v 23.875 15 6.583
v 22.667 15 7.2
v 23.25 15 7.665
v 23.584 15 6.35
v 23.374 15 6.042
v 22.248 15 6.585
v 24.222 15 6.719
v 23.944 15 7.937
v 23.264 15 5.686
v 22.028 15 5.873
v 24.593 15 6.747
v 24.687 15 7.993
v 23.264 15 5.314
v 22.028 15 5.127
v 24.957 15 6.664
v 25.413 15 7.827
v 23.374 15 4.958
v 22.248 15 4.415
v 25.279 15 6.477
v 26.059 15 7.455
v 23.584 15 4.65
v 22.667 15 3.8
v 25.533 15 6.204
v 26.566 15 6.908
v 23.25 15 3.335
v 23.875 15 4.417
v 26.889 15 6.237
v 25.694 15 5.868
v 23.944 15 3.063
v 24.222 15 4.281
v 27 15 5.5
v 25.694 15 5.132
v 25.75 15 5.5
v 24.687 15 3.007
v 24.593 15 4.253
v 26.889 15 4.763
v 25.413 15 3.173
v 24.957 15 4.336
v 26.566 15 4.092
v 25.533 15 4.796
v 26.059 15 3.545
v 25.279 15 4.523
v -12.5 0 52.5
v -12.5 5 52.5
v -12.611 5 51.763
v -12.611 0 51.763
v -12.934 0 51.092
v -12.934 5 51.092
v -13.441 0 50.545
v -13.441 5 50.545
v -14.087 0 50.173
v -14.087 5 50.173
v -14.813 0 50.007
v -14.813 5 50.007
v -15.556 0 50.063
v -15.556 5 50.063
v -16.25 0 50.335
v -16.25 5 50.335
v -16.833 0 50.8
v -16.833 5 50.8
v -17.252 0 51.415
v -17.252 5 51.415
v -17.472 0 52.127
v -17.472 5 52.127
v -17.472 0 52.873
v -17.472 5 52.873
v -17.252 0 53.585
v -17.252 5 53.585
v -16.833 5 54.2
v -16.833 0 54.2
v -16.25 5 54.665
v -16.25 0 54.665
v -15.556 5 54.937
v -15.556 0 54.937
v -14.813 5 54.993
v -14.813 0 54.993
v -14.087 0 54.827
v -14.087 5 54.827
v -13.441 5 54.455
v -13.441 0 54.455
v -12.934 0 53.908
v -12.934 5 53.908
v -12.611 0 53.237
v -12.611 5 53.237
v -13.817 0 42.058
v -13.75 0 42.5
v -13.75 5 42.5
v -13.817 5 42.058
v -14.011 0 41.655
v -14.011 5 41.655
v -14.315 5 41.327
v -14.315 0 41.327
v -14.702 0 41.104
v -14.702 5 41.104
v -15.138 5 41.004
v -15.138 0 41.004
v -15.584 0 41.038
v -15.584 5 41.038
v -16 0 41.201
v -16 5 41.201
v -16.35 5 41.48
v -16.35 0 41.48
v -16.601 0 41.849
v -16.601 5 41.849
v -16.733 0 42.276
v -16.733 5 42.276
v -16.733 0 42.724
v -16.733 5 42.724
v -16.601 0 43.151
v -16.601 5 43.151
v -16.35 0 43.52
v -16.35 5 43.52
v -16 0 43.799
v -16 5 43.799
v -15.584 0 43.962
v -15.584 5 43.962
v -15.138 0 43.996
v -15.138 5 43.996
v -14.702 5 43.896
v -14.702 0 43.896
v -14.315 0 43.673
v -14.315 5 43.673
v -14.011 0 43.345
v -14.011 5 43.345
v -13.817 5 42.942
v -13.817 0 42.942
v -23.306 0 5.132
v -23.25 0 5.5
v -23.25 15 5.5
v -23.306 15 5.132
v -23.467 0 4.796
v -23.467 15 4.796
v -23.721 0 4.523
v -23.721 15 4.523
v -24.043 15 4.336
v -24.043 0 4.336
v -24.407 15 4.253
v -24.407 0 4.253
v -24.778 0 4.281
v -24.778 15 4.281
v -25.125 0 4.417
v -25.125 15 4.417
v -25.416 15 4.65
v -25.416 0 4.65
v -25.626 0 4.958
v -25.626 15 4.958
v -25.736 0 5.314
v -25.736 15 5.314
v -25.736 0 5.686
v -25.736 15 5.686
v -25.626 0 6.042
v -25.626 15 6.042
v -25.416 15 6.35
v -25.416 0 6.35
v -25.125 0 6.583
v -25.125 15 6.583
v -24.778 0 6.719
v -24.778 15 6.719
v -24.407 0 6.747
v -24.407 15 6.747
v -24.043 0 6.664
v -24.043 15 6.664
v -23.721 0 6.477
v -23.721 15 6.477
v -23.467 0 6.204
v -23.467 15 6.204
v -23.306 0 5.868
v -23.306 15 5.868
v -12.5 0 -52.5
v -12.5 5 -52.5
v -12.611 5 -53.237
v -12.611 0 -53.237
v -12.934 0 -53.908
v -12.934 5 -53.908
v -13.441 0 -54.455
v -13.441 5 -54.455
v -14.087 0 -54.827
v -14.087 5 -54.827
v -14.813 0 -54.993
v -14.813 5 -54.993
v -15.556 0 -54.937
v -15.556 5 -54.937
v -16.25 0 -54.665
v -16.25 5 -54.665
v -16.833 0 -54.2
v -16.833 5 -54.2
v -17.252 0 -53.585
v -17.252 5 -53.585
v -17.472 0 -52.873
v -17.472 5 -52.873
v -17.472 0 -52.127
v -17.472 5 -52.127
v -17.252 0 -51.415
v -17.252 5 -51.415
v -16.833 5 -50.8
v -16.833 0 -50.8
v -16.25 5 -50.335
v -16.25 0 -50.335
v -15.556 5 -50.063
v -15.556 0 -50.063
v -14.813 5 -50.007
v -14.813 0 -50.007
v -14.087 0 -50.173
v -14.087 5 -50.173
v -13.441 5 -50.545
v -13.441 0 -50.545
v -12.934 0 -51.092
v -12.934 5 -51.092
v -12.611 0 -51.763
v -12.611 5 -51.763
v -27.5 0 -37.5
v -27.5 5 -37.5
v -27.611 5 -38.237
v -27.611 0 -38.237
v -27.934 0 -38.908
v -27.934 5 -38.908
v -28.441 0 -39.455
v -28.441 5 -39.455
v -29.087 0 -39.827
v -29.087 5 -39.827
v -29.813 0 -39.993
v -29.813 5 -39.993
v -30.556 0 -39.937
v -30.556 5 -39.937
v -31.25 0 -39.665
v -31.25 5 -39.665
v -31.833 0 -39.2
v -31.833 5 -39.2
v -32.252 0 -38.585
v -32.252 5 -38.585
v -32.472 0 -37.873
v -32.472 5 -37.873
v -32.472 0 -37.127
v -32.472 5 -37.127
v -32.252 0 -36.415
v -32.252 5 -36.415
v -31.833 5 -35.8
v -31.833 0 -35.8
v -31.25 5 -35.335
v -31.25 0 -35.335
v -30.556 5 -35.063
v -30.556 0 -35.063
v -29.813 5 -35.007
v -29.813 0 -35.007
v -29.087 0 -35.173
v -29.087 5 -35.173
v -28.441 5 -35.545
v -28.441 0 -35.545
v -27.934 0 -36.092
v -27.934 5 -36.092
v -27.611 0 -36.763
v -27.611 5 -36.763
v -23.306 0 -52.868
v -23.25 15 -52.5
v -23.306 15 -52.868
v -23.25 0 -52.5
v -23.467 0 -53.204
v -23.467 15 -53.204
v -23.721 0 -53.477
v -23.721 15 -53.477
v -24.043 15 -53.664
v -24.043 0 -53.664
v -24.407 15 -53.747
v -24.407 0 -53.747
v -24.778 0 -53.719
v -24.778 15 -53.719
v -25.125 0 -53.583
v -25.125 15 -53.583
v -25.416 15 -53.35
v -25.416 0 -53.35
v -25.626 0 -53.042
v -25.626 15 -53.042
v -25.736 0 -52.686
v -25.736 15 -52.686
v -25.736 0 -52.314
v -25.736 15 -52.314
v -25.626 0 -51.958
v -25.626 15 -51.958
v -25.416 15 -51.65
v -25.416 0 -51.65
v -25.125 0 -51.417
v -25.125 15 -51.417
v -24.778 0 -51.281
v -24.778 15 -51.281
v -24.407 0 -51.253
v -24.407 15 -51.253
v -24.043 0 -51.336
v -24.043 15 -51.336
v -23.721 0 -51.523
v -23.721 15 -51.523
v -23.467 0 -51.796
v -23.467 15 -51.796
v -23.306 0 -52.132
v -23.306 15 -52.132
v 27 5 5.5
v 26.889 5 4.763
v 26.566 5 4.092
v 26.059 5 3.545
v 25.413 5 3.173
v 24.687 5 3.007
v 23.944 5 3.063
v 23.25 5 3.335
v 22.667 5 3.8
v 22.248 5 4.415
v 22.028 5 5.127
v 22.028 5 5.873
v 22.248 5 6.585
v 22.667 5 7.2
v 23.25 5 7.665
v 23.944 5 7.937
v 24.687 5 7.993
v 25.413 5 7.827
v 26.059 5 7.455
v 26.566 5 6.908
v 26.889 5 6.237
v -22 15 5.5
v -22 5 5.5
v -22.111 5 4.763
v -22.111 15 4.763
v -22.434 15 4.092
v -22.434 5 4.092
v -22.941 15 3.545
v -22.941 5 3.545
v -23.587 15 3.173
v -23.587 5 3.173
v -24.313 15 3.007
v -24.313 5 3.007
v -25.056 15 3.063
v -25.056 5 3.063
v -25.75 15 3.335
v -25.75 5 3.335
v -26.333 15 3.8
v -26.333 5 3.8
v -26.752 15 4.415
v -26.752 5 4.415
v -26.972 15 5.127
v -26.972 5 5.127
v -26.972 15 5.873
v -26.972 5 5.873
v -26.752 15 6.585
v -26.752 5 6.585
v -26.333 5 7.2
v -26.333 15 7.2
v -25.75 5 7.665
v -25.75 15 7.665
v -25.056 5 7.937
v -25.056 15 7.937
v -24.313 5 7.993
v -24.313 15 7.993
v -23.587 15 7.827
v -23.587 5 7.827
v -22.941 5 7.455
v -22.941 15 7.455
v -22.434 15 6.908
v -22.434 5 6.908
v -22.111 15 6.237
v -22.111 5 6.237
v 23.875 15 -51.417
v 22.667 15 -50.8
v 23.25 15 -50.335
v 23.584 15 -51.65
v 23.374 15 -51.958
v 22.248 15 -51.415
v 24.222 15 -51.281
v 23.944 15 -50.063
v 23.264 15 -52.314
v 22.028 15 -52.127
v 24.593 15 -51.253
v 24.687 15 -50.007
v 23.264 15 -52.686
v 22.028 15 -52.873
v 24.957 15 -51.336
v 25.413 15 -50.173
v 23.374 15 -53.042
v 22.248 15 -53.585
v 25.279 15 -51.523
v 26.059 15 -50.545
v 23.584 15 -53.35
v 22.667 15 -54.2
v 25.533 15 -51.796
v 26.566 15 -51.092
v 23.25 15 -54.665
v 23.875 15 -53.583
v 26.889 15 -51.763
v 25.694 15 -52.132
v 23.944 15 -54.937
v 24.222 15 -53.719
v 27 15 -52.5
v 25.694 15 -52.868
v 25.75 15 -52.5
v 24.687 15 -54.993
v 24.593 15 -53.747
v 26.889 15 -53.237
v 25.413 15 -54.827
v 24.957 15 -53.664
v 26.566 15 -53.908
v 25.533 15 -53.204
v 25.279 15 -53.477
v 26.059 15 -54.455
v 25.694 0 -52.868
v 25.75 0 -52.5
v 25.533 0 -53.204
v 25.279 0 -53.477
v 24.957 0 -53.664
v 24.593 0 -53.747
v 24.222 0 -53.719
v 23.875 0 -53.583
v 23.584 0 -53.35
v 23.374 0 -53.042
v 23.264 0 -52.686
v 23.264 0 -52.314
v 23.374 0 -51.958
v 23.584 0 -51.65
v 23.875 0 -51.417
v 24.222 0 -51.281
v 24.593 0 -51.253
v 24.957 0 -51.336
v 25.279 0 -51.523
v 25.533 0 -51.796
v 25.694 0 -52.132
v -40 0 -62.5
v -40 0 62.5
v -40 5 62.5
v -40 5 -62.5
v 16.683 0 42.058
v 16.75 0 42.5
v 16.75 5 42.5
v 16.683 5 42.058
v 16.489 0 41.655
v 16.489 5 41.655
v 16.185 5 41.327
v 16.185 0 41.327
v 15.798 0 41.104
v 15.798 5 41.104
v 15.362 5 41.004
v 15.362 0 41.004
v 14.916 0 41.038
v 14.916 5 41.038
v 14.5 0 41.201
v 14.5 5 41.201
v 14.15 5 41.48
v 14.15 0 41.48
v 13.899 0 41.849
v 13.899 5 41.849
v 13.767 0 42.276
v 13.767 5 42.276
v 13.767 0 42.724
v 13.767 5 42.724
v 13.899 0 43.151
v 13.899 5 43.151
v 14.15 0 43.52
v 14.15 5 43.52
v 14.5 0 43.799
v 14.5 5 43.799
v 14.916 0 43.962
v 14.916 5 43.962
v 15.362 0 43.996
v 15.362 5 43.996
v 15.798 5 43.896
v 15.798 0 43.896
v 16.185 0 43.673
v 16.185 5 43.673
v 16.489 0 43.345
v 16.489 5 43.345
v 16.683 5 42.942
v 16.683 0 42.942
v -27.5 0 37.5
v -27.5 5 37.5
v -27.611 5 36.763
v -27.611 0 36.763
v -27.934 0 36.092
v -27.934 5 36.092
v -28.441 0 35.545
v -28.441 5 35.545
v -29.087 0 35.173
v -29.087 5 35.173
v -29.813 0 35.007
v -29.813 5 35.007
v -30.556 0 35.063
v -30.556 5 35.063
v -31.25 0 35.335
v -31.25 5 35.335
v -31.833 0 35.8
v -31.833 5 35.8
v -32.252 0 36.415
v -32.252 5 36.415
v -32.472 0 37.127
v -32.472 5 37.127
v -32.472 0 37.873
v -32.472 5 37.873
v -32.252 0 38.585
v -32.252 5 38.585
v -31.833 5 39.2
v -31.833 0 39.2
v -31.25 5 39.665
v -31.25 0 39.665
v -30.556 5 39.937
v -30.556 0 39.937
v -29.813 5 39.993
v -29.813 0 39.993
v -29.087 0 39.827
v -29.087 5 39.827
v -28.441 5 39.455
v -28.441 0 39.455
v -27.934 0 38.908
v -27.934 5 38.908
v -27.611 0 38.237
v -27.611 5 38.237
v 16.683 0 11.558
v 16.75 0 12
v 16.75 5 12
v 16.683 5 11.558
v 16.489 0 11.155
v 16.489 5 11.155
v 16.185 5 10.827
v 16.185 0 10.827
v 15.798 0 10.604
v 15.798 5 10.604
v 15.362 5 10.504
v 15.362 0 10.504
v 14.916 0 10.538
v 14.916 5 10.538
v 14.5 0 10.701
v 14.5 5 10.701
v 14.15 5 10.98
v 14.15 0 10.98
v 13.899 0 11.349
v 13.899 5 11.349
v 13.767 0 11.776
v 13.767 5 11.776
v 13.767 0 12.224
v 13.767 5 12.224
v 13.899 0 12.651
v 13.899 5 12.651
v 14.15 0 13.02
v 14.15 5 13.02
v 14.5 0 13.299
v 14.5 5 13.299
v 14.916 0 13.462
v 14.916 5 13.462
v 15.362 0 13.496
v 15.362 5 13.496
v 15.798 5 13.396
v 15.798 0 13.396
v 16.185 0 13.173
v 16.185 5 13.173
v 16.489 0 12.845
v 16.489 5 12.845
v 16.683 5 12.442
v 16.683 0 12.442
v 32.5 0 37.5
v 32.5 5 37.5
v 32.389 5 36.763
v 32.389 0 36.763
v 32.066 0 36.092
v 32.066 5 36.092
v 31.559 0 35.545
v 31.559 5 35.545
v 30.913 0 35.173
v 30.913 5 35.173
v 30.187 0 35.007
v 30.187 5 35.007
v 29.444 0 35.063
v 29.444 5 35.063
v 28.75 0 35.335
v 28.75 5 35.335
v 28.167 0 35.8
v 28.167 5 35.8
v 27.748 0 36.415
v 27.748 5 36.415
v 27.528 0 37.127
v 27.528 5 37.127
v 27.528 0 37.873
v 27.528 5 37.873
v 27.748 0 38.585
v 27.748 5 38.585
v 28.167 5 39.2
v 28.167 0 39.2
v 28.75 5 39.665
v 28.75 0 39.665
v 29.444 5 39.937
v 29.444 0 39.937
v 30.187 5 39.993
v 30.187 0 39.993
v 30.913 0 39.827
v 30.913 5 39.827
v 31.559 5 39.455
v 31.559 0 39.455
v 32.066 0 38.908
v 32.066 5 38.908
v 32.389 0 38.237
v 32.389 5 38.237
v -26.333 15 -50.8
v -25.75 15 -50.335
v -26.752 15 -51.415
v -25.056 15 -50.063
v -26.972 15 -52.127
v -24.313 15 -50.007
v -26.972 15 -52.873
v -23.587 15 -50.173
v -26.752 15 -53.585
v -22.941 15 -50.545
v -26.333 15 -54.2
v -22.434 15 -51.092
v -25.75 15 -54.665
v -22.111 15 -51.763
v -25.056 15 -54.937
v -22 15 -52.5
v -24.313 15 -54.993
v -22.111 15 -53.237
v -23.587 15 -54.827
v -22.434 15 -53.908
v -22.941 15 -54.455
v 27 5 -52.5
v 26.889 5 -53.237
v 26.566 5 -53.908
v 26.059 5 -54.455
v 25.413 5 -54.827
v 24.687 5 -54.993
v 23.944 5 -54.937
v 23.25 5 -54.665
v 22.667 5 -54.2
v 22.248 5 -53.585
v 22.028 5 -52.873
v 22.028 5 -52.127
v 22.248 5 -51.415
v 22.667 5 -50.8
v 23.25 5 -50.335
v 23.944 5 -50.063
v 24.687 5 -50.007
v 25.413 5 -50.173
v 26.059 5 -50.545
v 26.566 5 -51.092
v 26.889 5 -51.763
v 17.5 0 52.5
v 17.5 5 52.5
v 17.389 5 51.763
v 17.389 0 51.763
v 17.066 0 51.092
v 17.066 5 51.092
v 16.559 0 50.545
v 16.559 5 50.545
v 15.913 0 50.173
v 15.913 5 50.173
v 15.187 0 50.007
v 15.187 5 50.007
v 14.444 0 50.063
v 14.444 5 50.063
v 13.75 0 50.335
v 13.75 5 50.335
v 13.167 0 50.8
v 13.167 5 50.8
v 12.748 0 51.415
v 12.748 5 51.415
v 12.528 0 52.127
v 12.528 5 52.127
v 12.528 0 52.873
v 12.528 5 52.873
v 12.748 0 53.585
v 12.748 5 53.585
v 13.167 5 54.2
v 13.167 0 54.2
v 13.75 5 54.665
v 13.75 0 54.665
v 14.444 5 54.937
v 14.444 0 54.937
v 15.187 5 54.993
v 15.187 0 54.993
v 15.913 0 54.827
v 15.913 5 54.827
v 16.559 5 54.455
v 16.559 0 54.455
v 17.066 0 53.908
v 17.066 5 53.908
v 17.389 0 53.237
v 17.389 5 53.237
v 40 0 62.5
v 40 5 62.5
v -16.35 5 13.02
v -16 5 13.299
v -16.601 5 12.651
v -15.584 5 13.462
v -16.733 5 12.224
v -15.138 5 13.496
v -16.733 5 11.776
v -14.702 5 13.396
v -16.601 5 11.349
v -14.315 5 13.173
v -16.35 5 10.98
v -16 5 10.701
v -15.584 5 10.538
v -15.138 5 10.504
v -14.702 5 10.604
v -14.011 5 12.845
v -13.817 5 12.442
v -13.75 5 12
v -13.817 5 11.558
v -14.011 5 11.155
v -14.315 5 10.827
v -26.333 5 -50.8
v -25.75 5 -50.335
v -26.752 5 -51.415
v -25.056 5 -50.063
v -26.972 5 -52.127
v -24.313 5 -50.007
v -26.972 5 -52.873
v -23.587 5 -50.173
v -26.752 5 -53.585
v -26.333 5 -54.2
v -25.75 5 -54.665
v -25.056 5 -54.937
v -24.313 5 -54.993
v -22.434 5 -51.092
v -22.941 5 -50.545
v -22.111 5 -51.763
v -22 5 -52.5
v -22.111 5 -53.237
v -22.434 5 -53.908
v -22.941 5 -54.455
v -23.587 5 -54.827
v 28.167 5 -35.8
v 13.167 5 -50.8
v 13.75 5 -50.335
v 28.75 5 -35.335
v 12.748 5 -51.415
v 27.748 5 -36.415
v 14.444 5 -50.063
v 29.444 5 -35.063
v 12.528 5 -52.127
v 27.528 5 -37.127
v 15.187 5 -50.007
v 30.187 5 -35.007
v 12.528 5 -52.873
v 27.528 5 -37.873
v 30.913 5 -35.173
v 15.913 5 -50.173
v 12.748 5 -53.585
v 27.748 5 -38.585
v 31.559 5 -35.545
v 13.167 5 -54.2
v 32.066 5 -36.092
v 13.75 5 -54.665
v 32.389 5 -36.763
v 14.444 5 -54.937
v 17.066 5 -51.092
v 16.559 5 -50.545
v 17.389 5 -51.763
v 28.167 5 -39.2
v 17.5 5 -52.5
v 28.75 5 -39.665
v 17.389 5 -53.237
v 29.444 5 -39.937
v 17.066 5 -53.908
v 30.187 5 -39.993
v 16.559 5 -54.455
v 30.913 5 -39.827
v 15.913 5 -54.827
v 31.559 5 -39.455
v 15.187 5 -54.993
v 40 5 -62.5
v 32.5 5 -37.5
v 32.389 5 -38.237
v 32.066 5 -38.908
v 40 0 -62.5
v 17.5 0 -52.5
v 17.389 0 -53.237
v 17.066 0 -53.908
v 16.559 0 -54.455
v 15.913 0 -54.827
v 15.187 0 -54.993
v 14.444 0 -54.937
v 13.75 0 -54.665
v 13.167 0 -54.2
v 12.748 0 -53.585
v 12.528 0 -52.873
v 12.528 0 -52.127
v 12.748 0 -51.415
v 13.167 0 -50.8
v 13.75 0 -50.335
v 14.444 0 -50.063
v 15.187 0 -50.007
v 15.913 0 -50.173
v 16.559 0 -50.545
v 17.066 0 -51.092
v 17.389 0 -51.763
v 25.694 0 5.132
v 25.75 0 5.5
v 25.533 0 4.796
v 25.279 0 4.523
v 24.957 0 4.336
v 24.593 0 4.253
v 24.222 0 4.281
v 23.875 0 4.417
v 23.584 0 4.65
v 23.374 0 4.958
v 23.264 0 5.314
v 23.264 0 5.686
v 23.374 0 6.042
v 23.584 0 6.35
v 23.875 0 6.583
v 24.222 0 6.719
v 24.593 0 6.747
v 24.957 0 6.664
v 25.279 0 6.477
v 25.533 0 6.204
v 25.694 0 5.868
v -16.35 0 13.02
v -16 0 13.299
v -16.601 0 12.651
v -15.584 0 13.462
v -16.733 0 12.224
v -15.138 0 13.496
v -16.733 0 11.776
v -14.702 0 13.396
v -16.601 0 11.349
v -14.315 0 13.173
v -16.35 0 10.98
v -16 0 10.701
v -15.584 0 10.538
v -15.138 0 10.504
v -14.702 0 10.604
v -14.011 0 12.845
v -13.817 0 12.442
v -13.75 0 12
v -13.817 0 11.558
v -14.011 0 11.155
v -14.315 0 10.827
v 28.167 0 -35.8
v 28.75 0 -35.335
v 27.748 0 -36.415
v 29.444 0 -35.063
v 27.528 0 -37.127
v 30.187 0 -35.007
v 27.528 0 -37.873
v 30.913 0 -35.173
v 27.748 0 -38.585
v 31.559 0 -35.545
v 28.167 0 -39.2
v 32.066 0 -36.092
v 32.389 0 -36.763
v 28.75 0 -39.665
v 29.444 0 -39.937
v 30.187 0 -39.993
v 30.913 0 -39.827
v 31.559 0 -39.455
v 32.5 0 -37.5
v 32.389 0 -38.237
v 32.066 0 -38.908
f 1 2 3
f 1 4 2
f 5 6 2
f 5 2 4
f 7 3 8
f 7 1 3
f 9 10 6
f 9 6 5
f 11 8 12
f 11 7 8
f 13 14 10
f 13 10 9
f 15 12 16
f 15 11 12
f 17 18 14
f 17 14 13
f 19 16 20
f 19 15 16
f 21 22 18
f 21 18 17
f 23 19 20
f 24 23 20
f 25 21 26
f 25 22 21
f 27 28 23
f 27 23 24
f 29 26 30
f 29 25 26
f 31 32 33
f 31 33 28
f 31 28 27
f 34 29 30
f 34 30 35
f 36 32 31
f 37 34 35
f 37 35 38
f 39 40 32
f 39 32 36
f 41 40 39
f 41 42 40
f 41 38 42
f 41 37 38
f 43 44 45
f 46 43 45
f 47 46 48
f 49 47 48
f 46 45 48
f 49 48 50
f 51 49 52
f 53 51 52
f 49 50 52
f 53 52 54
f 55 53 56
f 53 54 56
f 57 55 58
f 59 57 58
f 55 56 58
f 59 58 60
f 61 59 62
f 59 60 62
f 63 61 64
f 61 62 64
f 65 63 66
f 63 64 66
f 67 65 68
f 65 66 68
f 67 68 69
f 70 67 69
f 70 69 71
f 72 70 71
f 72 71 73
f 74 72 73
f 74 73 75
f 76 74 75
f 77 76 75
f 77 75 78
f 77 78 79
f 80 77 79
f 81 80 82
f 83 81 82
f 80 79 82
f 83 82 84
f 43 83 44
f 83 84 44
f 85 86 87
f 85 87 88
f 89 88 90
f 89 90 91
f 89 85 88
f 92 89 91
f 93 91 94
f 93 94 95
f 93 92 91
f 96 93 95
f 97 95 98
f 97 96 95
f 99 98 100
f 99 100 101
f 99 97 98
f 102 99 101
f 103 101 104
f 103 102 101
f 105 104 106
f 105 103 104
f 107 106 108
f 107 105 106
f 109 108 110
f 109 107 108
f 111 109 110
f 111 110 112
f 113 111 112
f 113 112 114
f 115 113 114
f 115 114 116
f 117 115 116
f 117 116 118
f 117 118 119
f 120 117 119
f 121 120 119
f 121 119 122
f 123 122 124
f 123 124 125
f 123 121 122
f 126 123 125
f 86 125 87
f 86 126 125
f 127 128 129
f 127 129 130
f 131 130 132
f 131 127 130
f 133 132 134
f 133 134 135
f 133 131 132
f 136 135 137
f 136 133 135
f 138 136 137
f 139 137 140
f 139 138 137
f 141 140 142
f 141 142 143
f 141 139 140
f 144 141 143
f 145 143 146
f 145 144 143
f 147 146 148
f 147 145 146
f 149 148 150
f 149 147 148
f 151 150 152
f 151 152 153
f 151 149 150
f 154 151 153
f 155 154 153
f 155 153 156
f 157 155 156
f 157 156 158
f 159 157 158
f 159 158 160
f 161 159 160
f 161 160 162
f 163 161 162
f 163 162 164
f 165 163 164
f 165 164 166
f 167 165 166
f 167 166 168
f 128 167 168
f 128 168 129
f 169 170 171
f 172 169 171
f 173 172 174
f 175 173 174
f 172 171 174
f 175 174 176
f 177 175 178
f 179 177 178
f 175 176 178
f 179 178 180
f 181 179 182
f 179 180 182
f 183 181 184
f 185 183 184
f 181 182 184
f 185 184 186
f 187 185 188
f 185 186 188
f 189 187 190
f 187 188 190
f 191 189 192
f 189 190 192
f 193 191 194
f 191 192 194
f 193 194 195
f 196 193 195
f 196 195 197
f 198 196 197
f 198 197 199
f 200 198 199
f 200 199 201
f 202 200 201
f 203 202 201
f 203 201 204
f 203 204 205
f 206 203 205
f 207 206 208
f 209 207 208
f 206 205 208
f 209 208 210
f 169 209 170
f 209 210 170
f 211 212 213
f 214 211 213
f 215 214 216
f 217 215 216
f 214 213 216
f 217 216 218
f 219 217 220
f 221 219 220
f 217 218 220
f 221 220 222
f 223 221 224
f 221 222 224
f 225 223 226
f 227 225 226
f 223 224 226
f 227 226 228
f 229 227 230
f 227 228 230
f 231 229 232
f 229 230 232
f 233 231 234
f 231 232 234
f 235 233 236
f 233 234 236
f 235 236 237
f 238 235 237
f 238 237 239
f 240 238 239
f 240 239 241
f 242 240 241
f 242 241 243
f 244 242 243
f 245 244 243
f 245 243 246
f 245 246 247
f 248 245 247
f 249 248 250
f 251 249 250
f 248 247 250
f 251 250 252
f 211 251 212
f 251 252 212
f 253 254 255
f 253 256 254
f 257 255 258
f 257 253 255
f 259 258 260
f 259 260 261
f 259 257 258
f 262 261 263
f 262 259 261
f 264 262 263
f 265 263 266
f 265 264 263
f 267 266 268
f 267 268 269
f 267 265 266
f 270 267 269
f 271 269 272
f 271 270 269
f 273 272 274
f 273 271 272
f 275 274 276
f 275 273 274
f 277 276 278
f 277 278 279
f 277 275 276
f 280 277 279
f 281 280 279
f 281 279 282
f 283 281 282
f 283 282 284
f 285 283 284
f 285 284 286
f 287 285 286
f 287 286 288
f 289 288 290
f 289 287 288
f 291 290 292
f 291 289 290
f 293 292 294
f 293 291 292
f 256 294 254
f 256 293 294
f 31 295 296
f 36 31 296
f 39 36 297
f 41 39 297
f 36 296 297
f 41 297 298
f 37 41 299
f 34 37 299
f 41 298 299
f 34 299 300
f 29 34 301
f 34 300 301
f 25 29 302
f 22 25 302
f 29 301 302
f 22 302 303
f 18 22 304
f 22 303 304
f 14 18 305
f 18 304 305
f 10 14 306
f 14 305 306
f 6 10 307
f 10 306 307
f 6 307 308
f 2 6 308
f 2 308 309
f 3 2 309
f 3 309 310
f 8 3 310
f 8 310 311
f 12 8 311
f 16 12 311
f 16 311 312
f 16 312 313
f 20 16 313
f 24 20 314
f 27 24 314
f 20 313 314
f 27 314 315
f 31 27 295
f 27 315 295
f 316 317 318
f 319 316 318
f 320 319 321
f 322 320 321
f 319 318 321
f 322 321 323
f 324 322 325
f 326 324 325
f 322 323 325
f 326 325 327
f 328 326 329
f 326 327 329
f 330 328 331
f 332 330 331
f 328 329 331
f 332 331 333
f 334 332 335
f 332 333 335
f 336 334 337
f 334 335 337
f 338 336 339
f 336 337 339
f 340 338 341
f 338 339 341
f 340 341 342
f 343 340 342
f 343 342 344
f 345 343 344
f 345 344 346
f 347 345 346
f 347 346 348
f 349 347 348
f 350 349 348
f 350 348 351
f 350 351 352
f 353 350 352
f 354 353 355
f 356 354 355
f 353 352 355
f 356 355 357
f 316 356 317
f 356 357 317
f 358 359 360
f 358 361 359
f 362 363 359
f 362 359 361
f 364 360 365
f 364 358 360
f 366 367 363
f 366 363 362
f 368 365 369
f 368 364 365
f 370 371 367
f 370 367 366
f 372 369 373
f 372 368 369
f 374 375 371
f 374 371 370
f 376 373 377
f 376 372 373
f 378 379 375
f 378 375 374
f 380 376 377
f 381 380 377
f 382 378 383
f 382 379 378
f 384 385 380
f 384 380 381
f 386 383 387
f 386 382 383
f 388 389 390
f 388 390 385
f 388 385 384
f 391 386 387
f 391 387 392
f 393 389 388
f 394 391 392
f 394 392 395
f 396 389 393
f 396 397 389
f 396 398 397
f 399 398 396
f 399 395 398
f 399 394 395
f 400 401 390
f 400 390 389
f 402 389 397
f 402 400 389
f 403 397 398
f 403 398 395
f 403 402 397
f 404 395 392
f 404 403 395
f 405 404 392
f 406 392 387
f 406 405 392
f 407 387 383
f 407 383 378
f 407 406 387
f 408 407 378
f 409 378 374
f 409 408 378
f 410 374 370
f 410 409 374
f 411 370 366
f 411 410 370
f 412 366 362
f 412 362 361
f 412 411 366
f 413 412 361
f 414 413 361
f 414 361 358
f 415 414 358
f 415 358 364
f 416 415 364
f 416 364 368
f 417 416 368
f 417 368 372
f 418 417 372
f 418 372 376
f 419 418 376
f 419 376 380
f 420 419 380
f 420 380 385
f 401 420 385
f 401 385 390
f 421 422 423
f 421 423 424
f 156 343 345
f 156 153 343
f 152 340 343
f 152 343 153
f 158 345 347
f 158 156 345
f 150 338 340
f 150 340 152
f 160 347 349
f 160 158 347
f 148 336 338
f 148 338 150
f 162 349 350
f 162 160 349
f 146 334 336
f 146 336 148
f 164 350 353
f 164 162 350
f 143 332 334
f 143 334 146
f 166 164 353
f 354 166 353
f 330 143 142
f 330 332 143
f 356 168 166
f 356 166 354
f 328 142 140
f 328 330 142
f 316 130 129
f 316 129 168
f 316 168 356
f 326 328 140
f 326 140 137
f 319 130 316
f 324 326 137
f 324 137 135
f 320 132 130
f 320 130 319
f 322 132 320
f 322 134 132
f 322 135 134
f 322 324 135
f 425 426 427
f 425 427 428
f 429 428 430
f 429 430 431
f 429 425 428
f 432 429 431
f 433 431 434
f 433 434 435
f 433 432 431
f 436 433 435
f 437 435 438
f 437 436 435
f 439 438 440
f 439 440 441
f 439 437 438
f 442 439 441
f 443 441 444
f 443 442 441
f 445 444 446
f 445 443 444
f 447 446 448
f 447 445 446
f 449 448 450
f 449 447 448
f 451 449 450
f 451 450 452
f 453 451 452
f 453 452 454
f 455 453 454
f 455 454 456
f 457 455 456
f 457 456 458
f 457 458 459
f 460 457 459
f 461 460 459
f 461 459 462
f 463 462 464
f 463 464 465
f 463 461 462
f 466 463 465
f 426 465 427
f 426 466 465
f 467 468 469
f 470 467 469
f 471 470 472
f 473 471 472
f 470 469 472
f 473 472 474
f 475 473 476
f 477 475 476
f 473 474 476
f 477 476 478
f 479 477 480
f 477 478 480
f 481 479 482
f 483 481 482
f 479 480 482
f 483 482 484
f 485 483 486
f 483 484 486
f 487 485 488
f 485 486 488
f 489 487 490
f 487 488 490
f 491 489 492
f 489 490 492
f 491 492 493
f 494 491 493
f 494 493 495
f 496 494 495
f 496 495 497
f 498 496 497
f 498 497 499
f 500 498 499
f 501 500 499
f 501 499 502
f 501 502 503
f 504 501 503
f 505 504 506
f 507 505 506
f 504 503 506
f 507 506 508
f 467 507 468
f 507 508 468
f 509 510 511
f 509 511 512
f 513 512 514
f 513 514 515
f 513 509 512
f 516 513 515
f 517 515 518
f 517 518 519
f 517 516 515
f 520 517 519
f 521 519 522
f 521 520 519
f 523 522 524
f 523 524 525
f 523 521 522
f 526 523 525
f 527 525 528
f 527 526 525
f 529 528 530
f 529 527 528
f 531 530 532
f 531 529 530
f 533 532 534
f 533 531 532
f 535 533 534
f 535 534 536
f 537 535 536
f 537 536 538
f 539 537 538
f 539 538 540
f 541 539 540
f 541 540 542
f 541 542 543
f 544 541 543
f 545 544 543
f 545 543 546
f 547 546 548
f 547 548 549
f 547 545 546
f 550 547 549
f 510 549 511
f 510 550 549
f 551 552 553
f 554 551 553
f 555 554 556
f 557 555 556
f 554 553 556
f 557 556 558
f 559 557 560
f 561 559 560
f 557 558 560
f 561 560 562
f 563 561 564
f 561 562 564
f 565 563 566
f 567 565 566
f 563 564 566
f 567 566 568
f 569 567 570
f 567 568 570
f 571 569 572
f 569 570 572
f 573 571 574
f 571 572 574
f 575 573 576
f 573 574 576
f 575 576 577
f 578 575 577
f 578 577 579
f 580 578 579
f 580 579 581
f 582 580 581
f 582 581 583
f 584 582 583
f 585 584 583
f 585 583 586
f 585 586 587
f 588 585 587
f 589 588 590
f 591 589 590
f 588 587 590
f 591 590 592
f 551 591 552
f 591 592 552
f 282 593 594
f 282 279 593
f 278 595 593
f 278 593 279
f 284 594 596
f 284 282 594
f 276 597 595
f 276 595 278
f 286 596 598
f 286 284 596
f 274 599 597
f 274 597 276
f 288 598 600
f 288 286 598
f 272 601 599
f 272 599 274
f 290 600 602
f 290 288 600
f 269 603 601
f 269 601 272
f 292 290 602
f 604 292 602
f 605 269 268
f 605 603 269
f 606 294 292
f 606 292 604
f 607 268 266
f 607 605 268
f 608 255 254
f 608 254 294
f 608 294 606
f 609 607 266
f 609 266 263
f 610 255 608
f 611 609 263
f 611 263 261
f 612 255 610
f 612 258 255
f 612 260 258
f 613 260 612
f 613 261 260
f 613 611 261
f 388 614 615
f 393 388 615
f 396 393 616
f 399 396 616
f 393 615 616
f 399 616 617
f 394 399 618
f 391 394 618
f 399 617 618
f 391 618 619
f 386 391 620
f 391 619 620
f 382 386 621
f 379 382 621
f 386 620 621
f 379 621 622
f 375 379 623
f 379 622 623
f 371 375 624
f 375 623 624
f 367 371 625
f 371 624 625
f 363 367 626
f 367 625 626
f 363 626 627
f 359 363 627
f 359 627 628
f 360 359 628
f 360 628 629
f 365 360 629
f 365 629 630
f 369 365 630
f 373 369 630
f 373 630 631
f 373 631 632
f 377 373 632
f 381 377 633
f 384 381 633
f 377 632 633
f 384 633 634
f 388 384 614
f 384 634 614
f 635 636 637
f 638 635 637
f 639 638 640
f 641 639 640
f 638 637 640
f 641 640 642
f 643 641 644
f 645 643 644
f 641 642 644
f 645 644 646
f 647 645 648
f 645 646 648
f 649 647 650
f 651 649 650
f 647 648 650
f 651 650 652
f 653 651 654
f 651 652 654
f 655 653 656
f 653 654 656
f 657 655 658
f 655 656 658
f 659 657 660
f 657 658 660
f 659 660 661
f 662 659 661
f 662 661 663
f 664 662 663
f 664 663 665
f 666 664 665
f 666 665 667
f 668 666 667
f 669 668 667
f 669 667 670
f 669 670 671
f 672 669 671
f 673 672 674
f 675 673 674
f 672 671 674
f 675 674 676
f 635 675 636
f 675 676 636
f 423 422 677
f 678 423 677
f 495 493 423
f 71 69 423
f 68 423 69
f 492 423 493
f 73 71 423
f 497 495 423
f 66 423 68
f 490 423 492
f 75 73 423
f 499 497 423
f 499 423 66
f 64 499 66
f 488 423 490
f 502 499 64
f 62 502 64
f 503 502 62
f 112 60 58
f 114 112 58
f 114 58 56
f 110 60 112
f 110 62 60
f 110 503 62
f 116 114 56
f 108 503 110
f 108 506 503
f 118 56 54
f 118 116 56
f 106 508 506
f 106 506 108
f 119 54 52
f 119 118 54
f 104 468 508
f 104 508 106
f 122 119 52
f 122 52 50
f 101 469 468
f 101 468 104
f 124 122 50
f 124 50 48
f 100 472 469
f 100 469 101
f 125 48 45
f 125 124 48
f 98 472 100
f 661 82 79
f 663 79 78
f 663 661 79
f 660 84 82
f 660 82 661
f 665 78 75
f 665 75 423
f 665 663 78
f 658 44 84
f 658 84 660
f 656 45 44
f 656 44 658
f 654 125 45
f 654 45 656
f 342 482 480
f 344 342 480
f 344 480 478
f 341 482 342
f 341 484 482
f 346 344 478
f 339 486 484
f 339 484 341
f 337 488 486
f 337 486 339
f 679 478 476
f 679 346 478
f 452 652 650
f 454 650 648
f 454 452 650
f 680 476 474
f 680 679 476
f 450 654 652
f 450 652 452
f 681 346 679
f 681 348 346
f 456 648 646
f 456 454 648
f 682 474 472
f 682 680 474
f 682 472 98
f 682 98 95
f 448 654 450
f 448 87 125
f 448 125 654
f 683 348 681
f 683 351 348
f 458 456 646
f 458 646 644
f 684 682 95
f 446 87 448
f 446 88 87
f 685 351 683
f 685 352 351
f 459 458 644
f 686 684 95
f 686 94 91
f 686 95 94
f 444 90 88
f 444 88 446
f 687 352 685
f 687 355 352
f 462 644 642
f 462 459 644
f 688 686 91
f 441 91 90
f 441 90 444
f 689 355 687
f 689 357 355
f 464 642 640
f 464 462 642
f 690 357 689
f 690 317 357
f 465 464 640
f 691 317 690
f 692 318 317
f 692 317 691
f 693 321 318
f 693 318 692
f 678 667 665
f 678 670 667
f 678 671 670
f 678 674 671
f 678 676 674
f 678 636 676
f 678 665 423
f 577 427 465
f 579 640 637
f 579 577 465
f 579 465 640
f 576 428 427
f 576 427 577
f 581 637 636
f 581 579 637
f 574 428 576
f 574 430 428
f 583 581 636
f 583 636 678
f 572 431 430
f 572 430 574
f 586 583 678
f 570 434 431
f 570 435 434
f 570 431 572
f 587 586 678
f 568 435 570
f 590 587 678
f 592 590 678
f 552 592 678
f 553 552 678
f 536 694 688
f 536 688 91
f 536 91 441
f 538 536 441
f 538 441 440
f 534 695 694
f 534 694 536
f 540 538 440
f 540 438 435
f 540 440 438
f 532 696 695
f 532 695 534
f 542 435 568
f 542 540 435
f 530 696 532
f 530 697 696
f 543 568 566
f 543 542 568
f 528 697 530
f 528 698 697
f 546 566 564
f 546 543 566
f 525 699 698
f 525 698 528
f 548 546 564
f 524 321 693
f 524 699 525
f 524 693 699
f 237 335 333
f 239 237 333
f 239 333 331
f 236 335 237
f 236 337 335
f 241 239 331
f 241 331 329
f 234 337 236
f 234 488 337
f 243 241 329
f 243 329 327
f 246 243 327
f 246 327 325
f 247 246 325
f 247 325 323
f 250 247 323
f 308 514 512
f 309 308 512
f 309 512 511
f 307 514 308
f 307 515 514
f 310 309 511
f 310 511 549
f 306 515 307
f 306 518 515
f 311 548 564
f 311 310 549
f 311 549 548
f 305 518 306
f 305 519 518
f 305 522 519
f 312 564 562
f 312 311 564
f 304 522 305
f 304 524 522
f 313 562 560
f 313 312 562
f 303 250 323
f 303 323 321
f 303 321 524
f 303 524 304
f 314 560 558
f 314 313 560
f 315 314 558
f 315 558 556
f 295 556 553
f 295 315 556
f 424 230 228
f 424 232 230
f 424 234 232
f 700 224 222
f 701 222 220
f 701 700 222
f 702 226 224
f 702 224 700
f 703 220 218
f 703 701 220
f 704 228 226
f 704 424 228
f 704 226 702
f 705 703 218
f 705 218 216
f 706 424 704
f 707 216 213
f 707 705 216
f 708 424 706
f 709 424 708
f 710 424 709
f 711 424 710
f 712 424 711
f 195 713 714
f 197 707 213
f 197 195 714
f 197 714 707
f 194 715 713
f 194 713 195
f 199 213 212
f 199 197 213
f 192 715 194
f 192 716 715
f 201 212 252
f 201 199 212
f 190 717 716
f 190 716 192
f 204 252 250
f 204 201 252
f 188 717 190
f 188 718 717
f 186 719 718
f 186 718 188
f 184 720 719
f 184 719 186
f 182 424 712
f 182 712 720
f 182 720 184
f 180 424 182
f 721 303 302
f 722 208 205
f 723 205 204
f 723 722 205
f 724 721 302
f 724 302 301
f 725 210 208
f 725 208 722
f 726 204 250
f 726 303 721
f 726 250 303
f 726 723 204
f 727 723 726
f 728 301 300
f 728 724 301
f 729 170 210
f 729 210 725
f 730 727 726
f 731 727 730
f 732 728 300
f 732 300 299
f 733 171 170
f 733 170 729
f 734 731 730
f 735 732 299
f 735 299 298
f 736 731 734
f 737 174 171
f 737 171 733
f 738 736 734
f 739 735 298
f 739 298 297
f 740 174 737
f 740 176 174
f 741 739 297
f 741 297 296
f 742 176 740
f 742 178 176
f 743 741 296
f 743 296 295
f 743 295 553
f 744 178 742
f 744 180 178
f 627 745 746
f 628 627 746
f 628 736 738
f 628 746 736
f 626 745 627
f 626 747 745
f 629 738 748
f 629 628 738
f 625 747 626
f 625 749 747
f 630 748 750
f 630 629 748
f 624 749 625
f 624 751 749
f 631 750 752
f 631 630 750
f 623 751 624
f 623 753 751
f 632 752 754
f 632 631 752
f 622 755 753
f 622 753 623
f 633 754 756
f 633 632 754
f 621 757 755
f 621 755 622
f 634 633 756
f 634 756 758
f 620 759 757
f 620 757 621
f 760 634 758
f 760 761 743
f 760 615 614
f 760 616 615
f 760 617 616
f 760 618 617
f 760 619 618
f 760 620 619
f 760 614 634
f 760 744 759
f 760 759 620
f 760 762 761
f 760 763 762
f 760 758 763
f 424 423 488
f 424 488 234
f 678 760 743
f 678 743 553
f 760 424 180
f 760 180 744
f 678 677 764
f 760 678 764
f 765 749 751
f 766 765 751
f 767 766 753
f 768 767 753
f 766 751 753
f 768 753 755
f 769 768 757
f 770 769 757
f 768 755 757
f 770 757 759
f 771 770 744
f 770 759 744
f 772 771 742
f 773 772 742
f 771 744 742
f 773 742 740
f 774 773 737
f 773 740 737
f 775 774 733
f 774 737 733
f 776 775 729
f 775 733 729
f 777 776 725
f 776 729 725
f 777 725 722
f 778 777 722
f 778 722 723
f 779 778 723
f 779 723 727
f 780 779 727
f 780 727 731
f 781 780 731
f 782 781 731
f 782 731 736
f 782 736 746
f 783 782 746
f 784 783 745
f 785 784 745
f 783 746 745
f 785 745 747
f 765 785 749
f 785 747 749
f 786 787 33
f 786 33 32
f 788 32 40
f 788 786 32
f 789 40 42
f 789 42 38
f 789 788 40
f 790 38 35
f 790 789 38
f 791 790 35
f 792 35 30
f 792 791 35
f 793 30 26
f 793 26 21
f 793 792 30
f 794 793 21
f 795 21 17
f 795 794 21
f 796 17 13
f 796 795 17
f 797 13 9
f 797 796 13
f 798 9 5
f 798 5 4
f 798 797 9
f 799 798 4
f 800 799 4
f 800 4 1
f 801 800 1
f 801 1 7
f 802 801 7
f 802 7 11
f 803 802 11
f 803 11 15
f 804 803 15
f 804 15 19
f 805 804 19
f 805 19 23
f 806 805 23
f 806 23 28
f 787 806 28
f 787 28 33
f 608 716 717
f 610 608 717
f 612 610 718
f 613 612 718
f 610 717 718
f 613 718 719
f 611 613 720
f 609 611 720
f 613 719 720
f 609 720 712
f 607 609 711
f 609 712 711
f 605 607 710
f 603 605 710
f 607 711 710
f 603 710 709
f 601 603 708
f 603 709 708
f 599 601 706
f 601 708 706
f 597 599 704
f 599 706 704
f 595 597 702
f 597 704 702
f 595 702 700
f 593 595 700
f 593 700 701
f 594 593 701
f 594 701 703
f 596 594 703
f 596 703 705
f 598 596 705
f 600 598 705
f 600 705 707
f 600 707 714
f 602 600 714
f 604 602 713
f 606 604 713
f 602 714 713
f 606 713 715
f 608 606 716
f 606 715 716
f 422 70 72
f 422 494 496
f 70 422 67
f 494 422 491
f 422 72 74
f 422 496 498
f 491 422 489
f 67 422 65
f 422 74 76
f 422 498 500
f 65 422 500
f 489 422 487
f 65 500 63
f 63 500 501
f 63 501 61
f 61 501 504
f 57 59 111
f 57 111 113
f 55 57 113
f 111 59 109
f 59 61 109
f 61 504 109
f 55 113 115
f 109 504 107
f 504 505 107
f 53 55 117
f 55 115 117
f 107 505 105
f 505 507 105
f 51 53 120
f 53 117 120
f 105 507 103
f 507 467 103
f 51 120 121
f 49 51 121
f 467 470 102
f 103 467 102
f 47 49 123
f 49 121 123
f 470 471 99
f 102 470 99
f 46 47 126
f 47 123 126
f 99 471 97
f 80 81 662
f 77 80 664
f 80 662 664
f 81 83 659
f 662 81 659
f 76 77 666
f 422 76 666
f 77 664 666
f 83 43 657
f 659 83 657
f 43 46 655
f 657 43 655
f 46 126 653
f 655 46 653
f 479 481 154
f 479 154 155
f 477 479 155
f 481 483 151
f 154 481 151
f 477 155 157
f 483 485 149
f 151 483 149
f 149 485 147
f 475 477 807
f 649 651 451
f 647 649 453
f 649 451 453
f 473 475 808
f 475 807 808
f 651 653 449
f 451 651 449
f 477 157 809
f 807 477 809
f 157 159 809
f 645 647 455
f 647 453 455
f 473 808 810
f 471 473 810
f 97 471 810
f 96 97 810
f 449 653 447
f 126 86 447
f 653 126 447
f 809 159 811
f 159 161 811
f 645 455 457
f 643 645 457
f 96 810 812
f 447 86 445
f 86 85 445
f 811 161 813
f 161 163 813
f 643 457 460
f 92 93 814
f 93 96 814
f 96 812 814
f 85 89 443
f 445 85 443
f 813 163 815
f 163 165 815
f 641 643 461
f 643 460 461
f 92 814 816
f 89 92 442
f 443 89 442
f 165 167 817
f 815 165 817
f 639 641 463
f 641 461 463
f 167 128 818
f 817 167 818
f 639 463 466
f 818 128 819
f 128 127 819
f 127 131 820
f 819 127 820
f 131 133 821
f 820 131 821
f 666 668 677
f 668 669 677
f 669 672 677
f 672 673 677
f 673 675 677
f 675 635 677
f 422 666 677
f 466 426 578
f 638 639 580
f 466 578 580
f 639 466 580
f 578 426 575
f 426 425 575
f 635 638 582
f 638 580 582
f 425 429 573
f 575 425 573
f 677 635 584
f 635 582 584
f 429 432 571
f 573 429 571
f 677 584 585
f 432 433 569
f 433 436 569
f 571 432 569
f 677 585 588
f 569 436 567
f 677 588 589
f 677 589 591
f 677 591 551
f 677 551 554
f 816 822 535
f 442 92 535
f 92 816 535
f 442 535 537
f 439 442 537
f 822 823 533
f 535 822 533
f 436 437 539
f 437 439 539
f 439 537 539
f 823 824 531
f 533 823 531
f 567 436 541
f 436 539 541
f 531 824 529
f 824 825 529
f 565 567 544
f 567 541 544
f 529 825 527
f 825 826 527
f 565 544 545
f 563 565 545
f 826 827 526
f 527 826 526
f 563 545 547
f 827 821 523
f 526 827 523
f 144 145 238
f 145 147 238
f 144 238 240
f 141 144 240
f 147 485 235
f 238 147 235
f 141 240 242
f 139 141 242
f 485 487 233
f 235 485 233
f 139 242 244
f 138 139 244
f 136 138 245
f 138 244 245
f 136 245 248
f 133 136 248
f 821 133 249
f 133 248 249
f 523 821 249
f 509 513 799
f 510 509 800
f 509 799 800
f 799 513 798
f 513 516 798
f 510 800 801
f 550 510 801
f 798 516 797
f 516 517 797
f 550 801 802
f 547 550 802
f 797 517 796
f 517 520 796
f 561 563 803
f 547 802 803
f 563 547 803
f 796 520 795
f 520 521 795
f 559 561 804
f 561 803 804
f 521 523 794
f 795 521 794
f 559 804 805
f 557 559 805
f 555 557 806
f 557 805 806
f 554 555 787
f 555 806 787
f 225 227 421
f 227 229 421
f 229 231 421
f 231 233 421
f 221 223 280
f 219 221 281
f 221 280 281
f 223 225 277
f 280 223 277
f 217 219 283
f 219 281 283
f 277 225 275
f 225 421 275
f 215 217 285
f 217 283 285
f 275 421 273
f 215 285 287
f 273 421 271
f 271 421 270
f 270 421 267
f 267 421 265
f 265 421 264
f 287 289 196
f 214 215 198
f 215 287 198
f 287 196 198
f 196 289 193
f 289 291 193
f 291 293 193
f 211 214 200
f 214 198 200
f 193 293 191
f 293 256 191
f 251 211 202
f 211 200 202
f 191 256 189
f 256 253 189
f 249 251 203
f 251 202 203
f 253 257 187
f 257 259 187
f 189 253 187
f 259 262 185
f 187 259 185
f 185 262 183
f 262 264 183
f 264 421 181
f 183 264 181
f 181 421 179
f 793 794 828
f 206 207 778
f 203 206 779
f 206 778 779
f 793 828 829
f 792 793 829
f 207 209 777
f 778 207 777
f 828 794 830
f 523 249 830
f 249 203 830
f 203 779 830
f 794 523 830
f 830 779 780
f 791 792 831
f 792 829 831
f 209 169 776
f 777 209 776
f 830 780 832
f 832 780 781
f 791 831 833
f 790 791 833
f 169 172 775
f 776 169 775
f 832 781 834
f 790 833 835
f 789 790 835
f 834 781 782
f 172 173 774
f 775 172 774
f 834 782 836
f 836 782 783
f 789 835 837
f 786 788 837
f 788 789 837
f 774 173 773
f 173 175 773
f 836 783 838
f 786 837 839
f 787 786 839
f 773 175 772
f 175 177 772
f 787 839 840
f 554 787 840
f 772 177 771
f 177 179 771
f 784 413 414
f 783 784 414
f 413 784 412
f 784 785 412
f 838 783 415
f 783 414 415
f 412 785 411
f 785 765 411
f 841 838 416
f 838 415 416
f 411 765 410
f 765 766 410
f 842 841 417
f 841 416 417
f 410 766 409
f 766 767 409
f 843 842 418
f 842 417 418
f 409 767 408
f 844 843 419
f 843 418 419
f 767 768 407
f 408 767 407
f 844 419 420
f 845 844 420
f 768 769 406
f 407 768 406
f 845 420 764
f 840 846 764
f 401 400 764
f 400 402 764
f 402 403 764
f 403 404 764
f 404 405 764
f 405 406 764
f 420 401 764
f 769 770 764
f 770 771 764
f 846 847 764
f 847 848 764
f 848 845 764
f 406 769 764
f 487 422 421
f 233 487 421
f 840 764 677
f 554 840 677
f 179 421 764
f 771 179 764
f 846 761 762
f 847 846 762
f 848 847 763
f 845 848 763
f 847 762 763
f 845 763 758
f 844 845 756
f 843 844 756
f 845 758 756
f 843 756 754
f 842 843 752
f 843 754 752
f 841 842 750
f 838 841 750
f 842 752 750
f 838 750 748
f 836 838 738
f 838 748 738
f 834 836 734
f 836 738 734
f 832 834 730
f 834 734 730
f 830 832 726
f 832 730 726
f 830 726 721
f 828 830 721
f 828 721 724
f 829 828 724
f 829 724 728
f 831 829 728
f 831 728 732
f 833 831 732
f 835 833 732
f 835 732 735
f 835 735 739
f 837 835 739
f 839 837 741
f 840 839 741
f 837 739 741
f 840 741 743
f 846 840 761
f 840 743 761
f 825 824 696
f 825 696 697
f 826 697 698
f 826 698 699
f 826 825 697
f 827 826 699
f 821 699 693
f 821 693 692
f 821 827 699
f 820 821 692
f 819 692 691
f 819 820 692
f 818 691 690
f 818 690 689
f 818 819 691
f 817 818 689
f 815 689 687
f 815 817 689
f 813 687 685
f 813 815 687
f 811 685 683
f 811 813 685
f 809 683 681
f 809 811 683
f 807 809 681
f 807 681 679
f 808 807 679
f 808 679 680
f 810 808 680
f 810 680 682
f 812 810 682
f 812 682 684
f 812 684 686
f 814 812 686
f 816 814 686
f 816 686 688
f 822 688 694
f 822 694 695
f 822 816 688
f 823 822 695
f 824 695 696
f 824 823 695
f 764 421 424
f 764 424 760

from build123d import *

# Parameters (mm, degrees)
SKETCH1_W           = 80
SKETCH1_H           = 125
SKETCH1_R           = 1.25
SKETCH1_R_2         = 1.5
BOSS_EXTRUDE1_DEPTH = 5
SKETCH2_R           = 2.5
CUT_EXTRUDE1_DEPTH  = 5
SKETCH3_R           = 2.5
SKETCH3_R_2         = 1.25
BOSS_EXTRUDE2_DEPTH = 10


with BuildPart() as part:
    # Sketch1 → Boss-Extrude1 (new body)
    with BuildSketch(Plane(origin=(0, 0, 0), x_dir=(1, 0, 0), z_dir=(0, 1, 0))):
        Rectangle(SKETCH1_W, SKETCH1_H)
        with Locations((-24.5, 52.5)):
            Circle(SKETCH1_R, mode=Mode.SUBTRACT)
        with Locations((24.5, 52.5)):
            Circle(SKETCH1_R, mode=Mode.SUBTRACT)
        with Locations((-24.5, -5.5)):
            Circle(SKETCH1_R, mode=Mode.SUBTRACT)
        with Locations((24.5, -5.5)):
            Circle(SKETCH1_R, mode=Mode.SUBTRACT)
        with Locations((-15.25, -12)):
            Circle(SKETCH1_R_2, mode=Mode.SUBTRACT)
        with Locations((15.25, -12)):
            Circle(SKETCH1_R_2, mode=Mode.SUBTRACT)
        with Locations((-15.25, -42.5)):
            Circle(SKETCH1_R_2, mode=Mode.SUBTRACT)
        with Locations((15.25, -42.5)):
            Circle(SKETCH1_R_2, mode=Mode.SUBTRACT)
    extrude(amount=BOSS_EXTRUDE1_DEPTH)

    # Sketch2 → Cut-Extrude1 (cut)
    with BuildSketch(Plane(origin=(0, 5, 0), x_dir=(1, 0, 0), z_dir=(0, 1, 0))):
        with Locations((-15, 52.5)):
            Circle(SKETCH2_R)
        with Locations((-30, 37.5)):
            Circle(SKETCH2_R)
        with Locations((15, 52.5)):
            Circle(SKETCH2_R)
        with Locations((30, 37.5)):
            Circle(SKETCH2_R)
        with Locations((30, -37.5)):
            Circle(SKETCH2_R)
        with Locations((15, -52.5)):
            Circle(SKETCH2_R)
        with Locations((-15, -52.5)):
            Circle(SKETCH2_R)
        with Locations((-30, -37.5)):
            Circle(SKETCH2_R)
    extrude(amount=-CUT_EXTRUDE1_DEPTH, mode=Mode.SUBTRACT)

    # Sketch3 → Boss-Extrude2 (add)
    with BuildSketch(Plane(origin=(0, 5, 0), x_dir=(1, 0, 0), z_dir=(0, 1, 0))):
        with Locations((-24.5, 52.5)):
            Circle(SKETCH3_R)
        with Locations((-24.5, 52.5)):
            Circle(SKETCH3_R_2, mode=Mode.SUBTRACT)
        with Locations((24.5, 52.5)):
            Circle(SKETCH3_R)
        with Locations((24.5, 52.5)):
            Circle(SKETCH3_R_2, mode=Mode.SUBTRACT)
        with Locations((-24.5, -5.5)):
            Circle(SKETCH3_R)
        with Locations((-24.5, -5.5)):
            Circle(SKETCH3_R_2, mode=Mode.SUBTRACT)
        with Locations((24.5, -5.5)):
            Circle(SKETCH3_R)
        with Locations((24.5, -5.5)):
            Circle(SKETCH3_R_2, mode=Mode.SUBTRACT)
    extrude(amount=BOSS_EXTRUDE2_DEPTH)


solid = part.part
